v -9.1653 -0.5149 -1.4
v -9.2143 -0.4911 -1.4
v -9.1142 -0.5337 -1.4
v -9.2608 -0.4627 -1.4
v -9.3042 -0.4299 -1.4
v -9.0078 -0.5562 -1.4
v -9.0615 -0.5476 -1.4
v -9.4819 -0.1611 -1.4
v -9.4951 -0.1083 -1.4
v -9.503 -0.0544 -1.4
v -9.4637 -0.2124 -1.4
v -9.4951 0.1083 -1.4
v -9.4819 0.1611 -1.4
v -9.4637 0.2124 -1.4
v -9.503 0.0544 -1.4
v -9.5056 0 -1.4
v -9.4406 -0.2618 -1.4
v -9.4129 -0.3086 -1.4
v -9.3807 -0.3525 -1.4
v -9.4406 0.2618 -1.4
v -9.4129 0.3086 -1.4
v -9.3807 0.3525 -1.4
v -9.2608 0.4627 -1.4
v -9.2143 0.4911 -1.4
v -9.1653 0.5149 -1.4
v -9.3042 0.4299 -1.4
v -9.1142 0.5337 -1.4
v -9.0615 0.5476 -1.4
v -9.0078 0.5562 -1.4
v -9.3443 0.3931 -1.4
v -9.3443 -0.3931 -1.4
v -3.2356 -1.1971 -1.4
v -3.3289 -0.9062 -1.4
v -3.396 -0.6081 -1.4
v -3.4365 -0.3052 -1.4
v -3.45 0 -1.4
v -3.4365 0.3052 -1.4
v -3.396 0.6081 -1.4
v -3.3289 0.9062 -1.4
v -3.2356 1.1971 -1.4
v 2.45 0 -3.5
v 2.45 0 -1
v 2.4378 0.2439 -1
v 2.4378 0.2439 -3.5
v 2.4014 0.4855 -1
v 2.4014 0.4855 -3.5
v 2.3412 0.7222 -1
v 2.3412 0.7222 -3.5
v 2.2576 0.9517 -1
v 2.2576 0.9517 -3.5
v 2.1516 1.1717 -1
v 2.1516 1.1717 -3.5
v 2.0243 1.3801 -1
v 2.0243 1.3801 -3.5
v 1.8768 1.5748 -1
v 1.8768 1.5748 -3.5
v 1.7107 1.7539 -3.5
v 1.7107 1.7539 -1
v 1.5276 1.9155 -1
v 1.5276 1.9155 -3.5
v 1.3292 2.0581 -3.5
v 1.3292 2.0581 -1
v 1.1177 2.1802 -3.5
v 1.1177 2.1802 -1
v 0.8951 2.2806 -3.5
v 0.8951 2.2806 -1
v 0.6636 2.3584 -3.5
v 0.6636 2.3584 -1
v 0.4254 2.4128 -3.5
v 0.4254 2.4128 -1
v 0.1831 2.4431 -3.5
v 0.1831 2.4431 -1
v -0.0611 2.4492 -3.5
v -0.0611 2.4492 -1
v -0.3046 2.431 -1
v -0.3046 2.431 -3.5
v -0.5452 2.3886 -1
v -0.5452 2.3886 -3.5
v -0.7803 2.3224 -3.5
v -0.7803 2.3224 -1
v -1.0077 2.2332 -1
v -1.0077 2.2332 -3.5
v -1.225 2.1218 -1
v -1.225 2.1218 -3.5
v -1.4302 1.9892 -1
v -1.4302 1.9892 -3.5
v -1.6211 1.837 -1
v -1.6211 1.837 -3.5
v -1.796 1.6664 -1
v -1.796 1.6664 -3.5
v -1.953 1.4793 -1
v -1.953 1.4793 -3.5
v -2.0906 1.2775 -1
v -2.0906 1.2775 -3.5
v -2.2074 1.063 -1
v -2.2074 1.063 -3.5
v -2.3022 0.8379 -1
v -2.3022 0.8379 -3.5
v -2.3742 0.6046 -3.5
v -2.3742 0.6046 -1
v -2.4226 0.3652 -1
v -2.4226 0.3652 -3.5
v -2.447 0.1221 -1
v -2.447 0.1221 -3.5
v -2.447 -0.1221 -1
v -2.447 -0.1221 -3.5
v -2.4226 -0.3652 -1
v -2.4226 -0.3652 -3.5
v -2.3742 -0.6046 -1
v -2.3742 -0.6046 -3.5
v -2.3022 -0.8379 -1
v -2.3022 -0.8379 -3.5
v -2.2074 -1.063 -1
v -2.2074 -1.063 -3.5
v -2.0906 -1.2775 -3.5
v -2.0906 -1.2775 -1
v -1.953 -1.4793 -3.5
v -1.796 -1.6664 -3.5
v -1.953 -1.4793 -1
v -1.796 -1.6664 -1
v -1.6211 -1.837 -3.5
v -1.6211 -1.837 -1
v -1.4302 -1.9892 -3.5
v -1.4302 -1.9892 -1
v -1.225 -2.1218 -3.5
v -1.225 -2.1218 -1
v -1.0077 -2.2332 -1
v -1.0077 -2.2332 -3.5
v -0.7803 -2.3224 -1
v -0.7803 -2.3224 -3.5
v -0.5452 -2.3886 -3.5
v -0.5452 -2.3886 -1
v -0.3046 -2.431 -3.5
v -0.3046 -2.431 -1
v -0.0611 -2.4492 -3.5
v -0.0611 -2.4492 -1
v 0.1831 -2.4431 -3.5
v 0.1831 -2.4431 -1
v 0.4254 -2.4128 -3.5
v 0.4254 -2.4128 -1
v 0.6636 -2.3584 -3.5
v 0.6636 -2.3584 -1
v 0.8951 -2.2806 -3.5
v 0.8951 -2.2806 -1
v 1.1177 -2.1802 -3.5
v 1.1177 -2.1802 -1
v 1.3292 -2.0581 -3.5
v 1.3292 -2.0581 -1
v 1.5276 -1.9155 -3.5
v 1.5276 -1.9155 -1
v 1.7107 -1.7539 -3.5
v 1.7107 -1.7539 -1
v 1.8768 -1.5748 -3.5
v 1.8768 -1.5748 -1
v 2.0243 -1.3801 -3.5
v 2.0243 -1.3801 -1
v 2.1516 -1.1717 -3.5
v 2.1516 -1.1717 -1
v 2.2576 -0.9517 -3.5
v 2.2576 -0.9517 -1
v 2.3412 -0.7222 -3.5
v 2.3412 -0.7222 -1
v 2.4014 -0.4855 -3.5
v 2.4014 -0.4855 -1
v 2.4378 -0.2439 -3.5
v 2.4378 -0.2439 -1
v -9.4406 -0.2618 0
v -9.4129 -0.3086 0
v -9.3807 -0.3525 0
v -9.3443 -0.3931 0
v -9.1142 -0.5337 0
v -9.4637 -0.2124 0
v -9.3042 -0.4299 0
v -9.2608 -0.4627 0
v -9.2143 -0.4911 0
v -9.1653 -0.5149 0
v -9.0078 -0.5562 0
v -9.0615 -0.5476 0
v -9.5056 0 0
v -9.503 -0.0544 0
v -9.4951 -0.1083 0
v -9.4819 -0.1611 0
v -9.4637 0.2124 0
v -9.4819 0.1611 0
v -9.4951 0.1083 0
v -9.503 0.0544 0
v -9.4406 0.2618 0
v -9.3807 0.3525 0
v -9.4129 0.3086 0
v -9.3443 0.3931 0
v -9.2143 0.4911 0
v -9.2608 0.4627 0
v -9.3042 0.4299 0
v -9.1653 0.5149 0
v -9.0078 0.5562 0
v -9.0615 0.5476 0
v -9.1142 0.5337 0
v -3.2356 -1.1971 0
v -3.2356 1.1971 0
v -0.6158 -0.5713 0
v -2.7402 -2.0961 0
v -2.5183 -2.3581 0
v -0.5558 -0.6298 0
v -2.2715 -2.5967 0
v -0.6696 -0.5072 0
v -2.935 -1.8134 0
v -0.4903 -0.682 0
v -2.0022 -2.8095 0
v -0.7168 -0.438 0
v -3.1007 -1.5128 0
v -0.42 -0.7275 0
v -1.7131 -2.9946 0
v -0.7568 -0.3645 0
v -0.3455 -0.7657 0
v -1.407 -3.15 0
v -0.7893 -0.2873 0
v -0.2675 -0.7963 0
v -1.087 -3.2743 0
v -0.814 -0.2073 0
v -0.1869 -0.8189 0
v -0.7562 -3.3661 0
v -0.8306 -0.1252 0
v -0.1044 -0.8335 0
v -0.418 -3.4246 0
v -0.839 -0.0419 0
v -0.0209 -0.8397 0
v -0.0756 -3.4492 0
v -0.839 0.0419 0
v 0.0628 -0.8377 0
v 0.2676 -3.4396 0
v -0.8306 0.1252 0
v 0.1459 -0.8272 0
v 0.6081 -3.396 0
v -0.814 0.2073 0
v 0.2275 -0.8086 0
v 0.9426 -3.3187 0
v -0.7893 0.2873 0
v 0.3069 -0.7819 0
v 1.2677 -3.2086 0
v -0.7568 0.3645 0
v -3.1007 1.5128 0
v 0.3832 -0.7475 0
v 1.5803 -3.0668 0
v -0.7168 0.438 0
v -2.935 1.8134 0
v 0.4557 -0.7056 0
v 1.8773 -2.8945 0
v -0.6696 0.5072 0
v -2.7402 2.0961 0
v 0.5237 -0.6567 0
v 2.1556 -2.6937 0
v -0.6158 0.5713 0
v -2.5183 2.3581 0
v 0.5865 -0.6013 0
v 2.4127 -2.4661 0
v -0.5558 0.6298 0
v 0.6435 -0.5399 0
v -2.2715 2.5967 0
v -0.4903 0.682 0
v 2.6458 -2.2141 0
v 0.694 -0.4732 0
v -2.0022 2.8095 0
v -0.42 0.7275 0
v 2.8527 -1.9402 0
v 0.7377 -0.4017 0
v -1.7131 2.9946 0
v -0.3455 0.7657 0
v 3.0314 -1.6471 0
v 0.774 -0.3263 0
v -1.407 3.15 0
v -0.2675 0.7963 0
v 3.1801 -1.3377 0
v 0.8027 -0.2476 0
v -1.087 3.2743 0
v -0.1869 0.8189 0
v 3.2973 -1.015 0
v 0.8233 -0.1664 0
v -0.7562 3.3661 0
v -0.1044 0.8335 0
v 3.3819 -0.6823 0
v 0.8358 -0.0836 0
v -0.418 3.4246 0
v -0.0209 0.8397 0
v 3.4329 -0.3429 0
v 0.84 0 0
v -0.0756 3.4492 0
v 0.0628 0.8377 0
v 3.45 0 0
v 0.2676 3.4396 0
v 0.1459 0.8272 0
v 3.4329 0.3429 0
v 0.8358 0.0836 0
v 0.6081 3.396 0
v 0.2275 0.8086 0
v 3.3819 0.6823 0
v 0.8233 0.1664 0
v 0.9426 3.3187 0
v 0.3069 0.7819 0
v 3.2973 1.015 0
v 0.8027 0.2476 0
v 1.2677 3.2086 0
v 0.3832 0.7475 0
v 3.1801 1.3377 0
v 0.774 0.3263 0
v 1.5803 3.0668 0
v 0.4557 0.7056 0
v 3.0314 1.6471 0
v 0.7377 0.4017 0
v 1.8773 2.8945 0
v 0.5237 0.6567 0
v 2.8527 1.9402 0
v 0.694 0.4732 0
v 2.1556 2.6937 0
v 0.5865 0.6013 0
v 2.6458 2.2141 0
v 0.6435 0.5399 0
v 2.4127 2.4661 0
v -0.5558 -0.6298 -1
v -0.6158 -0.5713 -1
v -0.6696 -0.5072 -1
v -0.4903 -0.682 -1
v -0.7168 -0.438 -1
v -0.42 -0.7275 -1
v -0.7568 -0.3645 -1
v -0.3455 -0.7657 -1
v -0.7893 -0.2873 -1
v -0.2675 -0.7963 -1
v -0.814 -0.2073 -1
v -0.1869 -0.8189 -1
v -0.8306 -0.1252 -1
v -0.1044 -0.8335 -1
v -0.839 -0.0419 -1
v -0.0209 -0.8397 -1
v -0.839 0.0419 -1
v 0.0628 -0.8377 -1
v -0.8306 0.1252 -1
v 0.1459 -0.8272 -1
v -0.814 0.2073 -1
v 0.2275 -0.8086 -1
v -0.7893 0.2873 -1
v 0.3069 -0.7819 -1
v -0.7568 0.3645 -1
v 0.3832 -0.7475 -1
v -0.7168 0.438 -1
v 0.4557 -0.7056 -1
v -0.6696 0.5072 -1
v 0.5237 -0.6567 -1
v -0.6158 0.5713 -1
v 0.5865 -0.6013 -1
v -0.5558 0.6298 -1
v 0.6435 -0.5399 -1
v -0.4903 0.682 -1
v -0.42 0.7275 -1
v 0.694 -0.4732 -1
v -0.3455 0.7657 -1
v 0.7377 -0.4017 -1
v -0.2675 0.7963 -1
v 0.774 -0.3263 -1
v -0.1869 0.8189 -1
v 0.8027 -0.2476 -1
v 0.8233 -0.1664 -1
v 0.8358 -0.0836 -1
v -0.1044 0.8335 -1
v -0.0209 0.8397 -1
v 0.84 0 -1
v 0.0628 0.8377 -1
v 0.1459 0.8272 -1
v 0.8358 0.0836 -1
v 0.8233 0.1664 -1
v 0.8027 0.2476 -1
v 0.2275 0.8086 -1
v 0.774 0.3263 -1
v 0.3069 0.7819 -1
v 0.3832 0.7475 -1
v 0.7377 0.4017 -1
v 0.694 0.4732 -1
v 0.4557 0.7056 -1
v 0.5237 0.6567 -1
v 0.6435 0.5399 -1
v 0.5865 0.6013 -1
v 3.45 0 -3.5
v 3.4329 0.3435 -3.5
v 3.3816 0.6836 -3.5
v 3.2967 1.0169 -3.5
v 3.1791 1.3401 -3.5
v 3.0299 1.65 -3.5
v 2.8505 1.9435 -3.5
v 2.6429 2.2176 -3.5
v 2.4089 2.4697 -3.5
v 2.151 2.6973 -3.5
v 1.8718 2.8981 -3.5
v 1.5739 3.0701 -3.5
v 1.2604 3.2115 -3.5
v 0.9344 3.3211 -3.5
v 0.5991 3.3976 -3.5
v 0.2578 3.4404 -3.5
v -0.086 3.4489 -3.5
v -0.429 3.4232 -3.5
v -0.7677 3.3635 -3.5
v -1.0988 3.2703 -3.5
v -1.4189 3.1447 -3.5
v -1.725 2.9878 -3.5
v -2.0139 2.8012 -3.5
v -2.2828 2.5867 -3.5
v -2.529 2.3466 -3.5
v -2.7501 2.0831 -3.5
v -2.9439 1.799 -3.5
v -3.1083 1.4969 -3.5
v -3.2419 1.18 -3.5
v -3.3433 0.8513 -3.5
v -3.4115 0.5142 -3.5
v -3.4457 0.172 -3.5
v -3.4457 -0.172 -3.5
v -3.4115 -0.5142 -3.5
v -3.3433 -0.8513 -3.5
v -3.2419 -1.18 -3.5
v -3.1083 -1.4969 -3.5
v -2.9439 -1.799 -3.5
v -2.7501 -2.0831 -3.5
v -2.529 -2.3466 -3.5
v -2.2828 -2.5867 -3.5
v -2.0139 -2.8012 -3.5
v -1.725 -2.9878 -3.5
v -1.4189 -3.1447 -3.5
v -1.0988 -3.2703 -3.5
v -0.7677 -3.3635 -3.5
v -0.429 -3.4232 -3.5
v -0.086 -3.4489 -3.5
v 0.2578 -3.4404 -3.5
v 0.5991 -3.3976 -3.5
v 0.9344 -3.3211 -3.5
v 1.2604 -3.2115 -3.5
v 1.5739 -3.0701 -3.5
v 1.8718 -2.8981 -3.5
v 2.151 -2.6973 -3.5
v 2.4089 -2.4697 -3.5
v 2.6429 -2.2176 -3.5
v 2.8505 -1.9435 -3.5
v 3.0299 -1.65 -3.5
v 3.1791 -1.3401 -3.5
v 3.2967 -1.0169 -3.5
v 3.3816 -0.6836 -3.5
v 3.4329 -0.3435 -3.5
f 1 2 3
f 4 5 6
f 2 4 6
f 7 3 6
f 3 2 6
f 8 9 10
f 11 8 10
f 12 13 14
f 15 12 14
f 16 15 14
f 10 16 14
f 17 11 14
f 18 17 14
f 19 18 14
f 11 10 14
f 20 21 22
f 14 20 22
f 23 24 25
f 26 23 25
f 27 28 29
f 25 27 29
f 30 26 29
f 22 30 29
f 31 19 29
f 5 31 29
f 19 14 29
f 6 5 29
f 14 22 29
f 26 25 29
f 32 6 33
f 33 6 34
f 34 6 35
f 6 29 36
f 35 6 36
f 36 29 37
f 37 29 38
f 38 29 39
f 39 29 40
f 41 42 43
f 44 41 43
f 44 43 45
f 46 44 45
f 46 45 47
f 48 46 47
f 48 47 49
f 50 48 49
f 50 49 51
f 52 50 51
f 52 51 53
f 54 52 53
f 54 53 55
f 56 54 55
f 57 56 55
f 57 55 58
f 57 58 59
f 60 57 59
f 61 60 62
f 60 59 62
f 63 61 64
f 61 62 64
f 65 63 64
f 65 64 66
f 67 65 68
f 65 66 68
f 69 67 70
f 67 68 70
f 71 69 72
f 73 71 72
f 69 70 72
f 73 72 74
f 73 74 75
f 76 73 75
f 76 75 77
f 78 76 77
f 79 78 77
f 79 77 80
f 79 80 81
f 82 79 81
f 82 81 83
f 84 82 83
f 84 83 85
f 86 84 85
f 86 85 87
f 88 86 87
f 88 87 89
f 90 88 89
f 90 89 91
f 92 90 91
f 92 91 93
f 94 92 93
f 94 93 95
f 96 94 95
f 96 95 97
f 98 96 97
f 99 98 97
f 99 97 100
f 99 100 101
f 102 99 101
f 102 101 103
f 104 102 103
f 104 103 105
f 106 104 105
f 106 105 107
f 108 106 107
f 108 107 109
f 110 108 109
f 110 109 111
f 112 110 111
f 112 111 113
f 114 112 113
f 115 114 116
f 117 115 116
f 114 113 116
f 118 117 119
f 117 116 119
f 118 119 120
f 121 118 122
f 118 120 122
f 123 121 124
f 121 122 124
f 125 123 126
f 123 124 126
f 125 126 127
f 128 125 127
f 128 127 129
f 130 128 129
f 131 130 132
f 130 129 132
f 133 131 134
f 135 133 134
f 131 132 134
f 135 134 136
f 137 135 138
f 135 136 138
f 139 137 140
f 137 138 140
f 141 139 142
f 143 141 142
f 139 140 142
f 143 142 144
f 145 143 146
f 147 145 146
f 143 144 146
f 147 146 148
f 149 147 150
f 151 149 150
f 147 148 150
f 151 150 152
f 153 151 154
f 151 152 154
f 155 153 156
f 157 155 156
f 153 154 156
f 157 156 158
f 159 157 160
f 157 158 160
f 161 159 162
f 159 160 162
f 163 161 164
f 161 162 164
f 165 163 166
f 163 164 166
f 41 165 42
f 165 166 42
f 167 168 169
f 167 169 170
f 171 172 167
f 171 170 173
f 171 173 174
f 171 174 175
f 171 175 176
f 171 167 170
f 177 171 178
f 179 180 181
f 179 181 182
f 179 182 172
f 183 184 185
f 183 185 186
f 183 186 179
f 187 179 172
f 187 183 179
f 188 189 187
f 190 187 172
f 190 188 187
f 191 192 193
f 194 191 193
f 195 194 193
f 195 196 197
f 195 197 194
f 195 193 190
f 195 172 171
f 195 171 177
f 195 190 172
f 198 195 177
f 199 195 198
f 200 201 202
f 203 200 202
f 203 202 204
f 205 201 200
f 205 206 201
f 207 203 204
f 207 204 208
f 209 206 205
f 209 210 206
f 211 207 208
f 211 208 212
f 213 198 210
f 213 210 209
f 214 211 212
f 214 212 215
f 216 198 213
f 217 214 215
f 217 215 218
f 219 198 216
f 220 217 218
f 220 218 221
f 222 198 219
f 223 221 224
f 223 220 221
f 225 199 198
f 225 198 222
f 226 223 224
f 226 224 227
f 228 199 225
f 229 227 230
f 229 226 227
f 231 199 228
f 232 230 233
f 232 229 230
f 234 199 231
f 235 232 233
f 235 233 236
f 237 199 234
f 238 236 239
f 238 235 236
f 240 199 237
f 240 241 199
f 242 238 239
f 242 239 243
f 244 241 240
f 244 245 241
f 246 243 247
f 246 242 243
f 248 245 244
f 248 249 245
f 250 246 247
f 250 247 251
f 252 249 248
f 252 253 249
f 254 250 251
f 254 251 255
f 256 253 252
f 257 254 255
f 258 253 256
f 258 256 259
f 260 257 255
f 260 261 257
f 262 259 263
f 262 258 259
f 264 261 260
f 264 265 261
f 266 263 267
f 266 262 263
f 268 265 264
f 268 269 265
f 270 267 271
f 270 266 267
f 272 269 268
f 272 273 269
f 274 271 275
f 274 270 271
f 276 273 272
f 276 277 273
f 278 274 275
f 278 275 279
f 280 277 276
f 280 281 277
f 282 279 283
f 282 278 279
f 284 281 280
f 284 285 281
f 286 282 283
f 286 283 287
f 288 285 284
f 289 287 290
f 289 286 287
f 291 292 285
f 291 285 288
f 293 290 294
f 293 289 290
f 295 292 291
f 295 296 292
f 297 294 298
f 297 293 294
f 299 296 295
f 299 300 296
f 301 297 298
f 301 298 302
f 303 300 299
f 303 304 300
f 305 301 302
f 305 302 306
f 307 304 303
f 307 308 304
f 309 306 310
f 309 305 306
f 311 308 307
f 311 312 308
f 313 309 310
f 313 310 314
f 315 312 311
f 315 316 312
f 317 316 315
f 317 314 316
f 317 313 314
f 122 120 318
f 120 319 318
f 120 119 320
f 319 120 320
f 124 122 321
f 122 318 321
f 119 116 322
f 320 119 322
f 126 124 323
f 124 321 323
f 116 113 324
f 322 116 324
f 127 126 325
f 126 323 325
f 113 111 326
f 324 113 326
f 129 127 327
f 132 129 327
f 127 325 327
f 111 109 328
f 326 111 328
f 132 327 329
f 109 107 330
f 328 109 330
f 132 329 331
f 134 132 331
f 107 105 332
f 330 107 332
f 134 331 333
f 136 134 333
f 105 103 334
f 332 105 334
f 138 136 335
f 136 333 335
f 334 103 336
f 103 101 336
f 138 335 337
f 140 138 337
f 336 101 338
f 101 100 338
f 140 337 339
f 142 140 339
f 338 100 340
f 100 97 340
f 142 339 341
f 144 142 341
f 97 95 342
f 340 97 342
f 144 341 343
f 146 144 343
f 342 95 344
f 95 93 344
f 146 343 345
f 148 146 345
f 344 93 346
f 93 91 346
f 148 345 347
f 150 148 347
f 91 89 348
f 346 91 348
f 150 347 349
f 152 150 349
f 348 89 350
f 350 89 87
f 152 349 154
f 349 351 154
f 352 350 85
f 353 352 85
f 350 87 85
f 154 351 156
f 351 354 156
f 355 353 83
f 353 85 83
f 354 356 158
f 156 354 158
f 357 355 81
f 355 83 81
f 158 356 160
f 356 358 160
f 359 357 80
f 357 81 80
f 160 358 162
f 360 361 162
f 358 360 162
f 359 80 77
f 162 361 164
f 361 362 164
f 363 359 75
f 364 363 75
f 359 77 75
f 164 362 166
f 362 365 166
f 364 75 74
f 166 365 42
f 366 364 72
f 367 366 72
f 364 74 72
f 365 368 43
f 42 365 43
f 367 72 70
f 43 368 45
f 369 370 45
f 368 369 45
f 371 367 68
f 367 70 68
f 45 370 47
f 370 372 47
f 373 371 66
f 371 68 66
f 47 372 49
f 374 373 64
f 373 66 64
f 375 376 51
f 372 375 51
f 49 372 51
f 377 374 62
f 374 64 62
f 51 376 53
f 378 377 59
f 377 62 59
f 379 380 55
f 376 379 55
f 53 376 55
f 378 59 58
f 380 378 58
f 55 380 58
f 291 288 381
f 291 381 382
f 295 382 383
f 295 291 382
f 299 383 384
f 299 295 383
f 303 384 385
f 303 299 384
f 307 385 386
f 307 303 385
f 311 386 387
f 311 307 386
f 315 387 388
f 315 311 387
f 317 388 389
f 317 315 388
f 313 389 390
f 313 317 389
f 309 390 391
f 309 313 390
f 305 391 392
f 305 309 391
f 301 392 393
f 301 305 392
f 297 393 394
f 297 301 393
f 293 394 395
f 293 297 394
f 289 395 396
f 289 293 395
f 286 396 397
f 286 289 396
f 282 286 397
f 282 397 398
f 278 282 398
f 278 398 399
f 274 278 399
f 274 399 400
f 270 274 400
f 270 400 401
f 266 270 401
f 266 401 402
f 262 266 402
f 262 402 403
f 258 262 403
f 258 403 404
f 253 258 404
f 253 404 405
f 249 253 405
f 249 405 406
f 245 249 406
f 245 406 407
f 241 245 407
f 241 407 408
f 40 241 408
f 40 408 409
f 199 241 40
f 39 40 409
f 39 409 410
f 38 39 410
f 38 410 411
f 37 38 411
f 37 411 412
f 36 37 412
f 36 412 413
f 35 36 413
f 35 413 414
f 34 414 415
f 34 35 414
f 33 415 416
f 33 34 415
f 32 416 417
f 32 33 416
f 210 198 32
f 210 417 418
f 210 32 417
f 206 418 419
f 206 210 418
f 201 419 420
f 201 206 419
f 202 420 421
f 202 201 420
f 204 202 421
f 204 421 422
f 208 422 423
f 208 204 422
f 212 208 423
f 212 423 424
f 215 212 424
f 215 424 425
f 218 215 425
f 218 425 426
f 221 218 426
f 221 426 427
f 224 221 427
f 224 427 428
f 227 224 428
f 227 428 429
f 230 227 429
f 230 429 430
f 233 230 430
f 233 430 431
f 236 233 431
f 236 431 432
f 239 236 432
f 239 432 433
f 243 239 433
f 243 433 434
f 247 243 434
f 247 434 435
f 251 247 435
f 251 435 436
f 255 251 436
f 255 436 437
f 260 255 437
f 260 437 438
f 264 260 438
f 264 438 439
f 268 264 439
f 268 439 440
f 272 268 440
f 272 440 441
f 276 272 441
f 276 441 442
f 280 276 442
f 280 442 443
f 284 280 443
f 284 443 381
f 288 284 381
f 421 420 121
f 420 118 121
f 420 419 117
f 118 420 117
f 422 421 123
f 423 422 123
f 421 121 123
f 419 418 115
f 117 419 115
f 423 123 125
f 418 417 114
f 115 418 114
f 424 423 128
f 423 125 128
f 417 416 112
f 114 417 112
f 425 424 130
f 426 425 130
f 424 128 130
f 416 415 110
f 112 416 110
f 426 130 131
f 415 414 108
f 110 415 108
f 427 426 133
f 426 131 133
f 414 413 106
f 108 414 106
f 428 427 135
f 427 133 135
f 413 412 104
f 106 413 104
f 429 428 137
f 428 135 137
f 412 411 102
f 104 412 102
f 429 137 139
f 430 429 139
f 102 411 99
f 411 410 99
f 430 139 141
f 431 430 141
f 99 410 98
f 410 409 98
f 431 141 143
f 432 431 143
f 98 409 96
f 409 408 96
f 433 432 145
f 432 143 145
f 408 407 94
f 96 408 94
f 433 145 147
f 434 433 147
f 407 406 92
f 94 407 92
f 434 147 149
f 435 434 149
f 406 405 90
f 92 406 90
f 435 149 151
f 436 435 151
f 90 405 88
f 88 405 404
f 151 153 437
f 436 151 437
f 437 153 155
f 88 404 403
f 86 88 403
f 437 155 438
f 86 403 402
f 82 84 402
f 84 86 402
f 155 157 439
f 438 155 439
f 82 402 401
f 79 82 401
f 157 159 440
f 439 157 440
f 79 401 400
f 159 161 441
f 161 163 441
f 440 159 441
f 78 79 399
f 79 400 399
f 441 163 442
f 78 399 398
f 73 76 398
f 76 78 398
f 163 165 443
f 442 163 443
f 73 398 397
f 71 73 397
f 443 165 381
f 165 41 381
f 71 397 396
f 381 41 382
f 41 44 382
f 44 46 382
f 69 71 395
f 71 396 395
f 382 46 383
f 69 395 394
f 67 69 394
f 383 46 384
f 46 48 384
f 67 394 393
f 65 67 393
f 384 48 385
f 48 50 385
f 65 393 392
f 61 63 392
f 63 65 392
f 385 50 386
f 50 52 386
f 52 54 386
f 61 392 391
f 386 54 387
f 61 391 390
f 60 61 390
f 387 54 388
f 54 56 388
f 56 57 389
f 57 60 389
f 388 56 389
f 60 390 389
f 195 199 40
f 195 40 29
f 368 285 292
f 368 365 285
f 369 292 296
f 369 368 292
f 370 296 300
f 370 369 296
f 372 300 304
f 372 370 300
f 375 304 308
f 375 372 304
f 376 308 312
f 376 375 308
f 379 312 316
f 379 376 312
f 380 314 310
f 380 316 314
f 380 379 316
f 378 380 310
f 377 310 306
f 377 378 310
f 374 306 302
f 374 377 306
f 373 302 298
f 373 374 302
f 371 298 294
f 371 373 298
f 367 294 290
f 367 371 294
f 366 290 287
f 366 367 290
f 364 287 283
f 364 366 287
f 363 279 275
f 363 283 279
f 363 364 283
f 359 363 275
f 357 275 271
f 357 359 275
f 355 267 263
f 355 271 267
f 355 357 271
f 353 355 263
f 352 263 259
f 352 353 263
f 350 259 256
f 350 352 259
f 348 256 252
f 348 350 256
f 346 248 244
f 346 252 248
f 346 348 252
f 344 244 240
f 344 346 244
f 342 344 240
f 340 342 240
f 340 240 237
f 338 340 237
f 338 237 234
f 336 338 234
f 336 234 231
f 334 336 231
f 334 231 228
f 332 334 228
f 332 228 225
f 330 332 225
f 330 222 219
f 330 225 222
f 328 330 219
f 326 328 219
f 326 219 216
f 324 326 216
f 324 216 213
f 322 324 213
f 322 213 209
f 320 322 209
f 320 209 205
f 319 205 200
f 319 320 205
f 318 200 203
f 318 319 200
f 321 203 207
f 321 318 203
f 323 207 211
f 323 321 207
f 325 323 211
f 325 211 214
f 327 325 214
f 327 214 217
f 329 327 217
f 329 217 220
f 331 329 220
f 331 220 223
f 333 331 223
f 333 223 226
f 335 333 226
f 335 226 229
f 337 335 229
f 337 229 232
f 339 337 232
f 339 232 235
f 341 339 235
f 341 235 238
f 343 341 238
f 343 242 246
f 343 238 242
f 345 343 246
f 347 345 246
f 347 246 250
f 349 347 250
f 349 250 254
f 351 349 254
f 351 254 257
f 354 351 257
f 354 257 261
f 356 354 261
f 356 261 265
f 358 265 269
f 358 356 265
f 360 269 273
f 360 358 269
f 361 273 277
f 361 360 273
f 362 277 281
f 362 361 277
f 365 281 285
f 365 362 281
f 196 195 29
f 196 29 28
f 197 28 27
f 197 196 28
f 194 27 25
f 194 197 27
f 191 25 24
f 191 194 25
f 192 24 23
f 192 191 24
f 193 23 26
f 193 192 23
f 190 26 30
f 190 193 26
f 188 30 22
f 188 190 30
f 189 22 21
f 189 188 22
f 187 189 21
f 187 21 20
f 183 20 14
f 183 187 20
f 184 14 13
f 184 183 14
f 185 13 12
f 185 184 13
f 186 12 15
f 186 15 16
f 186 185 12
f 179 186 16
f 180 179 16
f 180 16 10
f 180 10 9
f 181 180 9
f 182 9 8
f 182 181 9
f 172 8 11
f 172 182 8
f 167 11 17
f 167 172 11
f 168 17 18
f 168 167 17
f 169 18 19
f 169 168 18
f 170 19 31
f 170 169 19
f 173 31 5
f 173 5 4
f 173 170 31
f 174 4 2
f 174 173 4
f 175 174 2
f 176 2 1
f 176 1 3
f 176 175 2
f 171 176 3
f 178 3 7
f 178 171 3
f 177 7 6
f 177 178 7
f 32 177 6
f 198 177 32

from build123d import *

# Parameters (mm, degrees)
SKETCH7_R               = 3.45
MAIN_BODY_DEPTH         = 3.5
MATE_HOLE_REACH         = 9.005
MATE_START              = -1
SKETCH9_R               = 2.45
CUT_EXTRUDE2_DEPTH      = 7.004581584
CUT_EXTRUDE2_DEPTH_BACK = 7.004581584
SKETCH10_R              = 0.84
BOSS_EXTRUDE2_DEPTH     = 1.4


with BuildPart() as part:
    # Sketch7 → main body (new body)
    with BuildSketch(Plane.XY):
        Circle(SKETCH7_R)
    extrude(amount=-MAIN_BODY_DEPTH)

    # Sketch9 → mate hole (cut, up to next)
    with BuildSketch(Plane.XY.offset(MATE_START), mode=Mode.PRIVATE) as mate_hole_sk1:
        Circle(SKETCH9_R)
    mate_hole_tool1 = extrude(mate_hole_sk1.sketch, amount=-MATE_HOLE_REACH, mode=Mode.PRIVATE) & part.part
    add(mate_hole_tool1.solids().sort_by_distance((0, 0, -1))[0], mode=Mode.SUBTRACT)

    # Sketch10 → Cut-Extrude2 (cut, two sides: drawn at the far end of the back side and taken through both)
    with BuildSketch(Plane.XY.offset(-CUT_EXTRUDE2_DEPTH_BACK)):
        Circle(SKETCH10_R)
    extrude(amount=CUT_EXTRUDE2_DEPTH + CUT_EXTRUDE2_DEPTH_BACK, mode=Mode.SUBTRACT)

    # Sketch11 → Boss-Extrude2 (add)
    with BuildSketch(Plane.XY):
        with BuildLine():
            Line((-3.235641734, 1.197130973), (-9.007776393, 0.556197651))
            ThreePointArc((-9.007776393, 0.556197651), (-9.505632664, 0), (-9.007776393, -0.556197651))
            Line((-9.007776393, -0.556197651), (-3.235641734, -1.197130973))
            ThreePointArc((-3.235641734, -1.197130973), (-3.45, 0), (-3.235641734, 1.197130973))
        make_face()
    extrude(amount=-BOSS_EXTRUDE2_DEPTH)


solid = part.part
